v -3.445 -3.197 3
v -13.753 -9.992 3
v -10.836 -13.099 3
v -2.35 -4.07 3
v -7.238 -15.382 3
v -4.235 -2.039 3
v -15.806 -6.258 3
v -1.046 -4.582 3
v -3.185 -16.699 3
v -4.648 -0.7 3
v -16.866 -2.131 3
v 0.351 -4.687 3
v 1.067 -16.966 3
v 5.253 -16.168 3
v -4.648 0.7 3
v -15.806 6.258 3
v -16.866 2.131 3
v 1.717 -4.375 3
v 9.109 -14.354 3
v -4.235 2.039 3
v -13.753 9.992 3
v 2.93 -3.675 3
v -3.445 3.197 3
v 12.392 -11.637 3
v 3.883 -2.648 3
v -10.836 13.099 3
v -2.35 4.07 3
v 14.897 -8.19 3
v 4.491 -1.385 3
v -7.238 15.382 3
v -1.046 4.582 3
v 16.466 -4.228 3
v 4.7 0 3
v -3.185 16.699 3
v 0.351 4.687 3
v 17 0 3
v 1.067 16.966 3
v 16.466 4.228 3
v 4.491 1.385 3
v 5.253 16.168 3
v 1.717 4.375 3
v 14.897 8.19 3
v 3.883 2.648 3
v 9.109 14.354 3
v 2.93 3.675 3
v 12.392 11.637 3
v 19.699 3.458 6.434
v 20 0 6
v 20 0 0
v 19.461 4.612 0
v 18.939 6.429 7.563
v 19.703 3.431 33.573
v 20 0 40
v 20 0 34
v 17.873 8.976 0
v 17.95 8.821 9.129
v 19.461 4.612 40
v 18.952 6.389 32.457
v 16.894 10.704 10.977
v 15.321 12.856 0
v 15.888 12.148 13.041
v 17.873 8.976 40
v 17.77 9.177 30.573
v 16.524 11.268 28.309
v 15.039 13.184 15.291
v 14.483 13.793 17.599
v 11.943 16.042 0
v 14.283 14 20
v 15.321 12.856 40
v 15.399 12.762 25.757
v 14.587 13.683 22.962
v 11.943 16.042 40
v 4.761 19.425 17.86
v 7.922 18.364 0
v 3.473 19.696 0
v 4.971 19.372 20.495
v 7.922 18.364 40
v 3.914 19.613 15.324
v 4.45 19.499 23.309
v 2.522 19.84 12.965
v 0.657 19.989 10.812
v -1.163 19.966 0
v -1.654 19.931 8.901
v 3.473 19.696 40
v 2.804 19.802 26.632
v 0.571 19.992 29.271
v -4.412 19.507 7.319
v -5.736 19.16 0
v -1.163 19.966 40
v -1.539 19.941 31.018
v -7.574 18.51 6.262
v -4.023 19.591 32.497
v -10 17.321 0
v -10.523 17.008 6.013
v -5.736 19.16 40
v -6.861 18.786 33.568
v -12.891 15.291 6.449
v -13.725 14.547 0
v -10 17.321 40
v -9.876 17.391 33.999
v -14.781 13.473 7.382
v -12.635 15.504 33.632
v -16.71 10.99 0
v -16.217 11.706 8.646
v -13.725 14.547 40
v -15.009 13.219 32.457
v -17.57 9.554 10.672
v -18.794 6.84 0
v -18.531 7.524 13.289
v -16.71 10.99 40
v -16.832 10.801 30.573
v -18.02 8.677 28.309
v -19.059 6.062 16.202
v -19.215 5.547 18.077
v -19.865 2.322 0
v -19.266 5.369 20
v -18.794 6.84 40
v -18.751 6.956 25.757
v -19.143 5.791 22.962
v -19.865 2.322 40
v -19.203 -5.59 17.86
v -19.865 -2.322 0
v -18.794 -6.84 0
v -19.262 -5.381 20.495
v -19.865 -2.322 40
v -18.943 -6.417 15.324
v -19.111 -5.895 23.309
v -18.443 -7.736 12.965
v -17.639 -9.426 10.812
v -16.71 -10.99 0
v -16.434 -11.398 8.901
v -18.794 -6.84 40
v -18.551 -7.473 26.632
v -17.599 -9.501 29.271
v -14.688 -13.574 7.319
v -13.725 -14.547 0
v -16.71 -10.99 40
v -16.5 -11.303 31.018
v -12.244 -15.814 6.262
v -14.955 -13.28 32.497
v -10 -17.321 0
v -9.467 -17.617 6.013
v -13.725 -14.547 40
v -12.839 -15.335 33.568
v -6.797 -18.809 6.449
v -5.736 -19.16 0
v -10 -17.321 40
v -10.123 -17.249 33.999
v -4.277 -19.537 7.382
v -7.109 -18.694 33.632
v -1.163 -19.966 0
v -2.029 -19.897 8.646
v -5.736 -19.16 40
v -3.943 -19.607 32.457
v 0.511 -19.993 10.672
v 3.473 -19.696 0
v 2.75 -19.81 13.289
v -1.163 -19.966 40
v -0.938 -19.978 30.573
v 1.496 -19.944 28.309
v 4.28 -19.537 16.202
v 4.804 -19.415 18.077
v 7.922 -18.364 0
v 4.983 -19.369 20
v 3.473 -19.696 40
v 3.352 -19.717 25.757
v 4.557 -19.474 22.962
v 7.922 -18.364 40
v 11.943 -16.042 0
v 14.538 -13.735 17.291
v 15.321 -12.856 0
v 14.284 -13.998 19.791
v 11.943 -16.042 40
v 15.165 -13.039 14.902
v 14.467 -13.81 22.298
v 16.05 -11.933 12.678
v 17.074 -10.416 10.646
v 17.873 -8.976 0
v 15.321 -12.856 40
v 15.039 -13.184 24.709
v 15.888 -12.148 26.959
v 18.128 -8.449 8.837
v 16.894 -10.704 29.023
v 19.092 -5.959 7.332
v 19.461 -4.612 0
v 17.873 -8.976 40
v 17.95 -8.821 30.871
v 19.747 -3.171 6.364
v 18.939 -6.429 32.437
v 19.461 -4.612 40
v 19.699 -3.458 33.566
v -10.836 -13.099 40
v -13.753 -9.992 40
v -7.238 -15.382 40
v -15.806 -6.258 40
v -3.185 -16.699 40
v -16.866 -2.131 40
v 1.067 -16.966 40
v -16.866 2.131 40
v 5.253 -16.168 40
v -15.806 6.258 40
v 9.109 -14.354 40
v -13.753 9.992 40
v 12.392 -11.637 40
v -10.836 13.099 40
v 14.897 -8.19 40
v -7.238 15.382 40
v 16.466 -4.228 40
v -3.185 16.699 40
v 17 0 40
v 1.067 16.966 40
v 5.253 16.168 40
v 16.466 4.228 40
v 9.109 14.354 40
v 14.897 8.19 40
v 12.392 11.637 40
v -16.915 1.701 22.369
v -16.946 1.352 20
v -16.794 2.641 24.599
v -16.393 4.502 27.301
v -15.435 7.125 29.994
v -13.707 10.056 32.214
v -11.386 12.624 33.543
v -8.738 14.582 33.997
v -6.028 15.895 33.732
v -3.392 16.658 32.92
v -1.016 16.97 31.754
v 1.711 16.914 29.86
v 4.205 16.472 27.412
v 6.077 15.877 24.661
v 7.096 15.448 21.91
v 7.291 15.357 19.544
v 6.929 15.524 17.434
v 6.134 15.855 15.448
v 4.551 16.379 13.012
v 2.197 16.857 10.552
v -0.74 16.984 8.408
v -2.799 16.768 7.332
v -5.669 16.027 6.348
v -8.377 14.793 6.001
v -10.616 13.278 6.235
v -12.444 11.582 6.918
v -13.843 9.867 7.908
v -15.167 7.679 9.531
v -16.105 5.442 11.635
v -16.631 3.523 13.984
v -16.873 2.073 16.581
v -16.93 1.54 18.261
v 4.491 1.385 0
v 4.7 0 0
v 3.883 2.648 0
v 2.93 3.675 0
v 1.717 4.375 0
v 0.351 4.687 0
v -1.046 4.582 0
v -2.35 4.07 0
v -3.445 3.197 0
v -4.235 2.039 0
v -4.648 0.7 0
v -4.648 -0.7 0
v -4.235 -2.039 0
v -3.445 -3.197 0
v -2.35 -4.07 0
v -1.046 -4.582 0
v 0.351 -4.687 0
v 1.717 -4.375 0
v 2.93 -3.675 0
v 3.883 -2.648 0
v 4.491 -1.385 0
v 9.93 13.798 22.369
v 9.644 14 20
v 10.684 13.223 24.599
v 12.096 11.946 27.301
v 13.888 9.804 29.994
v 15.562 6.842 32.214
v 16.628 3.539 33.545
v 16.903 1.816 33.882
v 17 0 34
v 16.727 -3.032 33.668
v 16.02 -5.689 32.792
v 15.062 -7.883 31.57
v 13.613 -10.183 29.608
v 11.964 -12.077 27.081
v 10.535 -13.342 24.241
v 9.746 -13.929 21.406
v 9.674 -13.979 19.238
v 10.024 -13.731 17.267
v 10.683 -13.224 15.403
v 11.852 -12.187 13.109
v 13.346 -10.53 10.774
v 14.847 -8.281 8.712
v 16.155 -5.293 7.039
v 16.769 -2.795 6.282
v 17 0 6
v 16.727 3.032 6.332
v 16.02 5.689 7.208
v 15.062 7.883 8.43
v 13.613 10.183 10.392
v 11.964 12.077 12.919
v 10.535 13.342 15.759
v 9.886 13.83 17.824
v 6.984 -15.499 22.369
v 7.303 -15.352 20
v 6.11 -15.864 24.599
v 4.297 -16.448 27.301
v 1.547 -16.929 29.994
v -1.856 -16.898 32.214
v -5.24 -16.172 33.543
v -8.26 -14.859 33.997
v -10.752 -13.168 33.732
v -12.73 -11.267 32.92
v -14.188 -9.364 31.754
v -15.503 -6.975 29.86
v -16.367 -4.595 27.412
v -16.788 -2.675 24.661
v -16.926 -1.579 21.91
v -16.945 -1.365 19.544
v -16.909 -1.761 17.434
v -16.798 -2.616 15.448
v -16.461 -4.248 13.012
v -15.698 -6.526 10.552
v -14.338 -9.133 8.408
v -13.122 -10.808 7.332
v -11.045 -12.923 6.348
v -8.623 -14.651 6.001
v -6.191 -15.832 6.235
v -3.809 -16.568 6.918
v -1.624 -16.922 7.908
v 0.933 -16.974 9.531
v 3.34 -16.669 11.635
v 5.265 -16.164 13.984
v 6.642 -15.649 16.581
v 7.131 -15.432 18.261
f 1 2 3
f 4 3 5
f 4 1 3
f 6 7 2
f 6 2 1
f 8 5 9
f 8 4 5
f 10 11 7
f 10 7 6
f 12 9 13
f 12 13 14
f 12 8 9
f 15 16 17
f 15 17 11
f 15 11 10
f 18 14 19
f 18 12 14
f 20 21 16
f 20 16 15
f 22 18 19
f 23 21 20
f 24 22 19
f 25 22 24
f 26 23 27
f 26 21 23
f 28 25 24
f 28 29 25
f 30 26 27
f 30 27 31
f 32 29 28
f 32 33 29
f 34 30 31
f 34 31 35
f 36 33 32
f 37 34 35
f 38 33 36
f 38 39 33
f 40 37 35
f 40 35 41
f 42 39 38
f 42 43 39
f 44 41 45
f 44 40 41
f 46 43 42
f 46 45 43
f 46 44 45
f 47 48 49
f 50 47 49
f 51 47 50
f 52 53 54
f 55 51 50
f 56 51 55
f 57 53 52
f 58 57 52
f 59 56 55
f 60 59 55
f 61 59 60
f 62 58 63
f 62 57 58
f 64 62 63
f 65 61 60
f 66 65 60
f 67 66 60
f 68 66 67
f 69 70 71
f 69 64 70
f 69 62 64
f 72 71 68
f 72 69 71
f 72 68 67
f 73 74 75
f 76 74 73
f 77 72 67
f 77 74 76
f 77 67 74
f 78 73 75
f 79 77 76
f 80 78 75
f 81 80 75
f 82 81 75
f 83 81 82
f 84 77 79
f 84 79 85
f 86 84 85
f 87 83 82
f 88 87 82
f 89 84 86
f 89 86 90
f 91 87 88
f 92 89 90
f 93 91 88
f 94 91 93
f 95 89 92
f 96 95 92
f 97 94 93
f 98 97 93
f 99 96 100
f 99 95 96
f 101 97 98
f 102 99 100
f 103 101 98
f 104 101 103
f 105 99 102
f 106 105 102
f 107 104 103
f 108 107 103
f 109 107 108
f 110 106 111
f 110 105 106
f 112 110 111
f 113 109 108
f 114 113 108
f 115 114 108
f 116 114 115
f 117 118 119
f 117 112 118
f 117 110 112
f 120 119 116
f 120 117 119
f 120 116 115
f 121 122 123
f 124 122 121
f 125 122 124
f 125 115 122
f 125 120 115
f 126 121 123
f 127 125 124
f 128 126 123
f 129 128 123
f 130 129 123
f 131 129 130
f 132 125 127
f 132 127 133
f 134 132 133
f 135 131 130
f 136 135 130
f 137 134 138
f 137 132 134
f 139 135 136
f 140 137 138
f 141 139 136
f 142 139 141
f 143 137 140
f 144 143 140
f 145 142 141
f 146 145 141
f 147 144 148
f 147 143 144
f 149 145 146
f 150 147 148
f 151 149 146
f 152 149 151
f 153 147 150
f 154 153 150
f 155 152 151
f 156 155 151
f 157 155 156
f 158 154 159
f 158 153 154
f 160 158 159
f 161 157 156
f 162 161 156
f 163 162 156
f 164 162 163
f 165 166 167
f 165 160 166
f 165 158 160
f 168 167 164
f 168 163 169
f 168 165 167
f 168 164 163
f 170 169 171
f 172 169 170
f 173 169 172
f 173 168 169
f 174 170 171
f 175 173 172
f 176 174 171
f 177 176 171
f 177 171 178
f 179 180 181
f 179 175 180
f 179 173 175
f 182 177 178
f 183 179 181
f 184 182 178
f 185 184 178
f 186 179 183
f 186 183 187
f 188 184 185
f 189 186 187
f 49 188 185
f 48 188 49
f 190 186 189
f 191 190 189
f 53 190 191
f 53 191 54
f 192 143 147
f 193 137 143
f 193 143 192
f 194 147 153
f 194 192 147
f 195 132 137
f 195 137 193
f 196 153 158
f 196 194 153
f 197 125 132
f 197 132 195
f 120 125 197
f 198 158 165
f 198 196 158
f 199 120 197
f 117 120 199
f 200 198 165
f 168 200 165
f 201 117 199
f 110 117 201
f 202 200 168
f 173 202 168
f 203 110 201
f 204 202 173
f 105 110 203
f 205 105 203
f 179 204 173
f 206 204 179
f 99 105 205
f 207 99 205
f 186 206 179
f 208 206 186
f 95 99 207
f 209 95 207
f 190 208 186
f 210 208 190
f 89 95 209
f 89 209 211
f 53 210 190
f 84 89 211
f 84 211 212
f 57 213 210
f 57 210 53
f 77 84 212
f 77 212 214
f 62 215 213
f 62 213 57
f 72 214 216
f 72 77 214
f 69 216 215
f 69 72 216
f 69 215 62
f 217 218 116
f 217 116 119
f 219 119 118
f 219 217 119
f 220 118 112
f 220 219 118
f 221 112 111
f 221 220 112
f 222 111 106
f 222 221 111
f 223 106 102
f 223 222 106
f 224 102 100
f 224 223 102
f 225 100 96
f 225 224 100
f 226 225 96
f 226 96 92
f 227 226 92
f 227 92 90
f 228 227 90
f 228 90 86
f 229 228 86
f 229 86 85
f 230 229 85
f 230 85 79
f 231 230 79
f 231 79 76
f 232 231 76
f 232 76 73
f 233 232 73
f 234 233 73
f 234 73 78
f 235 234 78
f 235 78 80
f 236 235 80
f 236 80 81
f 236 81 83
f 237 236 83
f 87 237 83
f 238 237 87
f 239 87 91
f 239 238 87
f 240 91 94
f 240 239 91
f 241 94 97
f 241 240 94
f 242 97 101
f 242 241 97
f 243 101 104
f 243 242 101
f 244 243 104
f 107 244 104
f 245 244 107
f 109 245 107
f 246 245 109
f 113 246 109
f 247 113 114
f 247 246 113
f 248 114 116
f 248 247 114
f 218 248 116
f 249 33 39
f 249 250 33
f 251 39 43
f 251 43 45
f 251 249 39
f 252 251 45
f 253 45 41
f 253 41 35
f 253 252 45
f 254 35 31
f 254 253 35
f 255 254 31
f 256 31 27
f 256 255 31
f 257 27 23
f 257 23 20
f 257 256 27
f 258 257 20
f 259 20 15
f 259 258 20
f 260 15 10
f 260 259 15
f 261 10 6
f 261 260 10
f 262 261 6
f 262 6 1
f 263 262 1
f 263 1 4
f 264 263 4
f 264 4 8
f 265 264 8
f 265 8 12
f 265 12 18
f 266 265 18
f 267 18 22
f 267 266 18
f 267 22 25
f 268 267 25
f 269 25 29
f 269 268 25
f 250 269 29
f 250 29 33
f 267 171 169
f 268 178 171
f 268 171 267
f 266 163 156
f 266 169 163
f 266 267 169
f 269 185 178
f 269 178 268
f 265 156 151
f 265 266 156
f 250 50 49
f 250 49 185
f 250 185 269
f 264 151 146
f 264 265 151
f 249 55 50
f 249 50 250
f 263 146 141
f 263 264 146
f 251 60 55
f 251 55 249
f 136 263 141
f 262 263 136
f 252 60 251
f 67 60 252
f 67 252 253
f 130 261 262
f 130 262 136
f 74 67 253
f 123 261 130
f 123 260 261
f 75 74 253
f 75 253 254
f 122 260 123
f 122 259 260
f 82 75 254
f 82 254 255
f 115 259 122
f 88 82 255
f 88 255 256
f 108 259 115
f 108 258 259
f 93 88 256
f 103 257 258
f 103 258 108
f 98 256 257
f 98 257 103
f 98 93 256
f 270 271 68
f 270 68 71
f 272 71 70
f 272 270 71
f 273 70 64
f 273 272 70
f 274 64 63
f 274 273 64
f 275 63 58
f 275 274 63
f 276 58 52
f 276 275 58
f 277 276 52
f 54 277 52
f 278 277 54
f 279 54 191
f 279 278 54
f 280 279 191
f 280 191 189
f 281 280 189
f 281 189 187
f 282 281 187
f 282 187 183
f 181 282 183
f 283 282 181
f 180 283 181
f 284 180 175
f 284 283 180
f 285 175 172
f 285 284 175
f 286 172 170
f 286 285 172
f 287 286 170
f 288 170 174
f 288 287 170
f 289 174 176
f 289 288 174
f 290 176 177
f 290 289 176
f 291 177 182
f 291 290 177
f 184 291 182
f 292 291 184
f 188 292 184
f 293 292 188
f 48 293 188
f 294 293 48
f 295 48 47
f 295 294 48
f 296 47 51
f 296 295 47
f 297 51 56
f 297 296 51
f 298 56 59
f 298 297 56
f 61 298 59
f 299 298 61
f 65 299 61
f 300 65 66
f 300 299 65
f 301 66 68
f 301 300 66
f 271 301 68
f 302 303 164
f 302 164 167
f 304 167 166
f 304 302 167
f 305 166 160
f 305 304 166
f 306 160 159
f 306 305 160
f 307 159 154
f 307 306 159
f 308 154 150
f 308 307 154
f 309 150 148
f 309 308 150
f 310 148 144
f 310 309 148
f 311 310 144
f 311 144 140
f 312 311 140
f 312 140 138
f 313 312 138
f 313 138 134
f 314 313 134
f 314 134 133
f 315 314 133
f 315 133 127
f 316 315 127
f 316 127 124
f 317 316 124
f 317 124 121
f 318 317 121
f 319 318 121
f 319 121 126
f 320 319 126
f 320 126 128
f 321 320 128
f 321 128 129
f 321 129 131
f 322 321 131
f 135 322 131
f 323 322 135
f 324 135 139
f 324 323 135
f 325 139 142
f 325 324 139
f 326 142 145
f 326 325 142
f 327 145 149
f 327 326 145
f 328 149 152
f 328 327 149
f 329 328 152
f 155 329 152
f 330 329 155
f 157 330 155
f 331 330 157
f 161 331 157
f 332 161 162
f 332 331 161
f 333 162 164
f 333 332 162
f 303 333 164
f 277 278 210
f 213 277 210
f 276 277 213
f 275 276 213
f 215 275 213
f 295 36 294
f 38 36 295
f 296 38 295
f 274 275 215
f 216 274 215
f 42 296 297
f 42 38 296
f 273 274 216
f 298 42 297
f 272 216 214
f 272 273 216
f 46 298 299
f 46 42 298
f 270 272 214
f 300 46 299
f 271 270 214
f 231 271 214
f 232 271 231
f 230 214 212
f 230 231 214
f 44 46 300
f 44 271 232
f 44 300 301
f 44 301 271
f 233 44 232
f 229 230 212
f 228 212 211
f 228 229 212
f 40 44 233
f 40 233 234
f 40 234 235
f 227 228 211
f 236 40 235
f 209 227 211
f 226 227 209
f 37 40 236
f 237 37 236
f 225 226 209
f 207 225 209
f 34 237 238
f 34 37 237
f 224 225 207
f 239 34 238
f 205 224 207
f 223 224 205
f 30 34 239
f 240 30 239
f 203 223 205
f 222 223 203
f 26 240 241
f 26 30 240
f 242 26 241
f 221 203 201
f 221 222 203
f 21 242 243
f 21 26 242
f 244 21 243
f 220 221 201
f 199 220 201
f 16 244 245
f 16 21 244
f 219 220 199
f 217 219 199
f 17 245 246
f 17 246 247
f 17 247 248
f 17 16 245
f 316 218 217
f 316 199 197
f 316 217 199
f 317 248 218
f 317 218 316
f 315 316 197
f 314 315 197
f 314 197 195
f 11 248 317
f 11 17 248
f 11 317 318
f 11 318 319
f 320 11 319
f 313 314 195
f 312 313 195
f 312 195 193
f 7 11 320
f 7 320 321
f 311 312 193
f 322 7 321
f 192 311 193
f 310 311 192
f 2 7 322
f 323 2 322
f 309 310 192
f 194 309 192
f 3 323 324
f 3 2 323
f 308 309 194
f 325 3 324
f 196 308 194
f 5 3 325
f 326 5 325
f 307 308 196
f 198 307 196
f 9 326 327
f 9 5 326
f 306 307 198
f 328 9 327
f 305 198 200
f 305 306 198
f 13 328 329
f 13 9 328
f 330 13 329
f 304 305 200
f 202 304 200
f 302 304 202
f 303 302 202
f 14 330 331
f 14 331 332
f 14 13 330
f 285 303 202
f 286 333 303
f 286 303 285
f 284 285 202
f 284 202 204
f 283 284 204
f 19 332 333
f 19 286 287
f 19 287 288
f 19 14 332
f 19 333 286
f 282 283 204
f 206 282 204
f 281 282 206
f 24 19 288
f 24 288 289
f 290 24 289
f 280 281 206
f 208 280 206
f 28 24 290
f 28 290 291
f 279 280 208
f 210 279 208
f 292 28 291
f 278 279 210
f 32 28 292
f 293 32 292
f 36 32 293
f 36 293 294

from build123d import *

# Parameters (mm, degrees)
CYLINDER_R         = 14
CYLINDER_DEPTH     = 100
POLARPATTERN_COUNT = 3


with BuildPart() as part:
    # Sketch → Revolution (revolve)
    with BuildSketch(Plane.XZ):
        Polygon((4.7, 0), (20, 0), (20, 40), (17, 40), (17, 3), (4.7, 3), align=None)
    revolve(axis=Axis((0, 0, 0), (0, 0, 1)))

    # Cylinder → Cylinder (cut)
    with BuildSketch(Plane(origin=(0, 0, 20), x_dir=(0, 1, 0), z_dir=(1, 0, 0))):
        Circle(CYLINDER_R)
    cylinder = extrude(amount=CYLINDER_DEPTH, mode=Mode.SUBTRACT)

    # PolarPattern: Cylinder ×3 about axis
    polarpattern_axis = Axis((0, 0, 0), (0, 0, 1))
    for i in range(1, POLARPATTERN_COUNT):
        add(cylinder.rotate(polarpattern_axis, i * 360 / POLARPATTERN_COUNT), mode=Mode.SUBTRACT)


solid = part.part
